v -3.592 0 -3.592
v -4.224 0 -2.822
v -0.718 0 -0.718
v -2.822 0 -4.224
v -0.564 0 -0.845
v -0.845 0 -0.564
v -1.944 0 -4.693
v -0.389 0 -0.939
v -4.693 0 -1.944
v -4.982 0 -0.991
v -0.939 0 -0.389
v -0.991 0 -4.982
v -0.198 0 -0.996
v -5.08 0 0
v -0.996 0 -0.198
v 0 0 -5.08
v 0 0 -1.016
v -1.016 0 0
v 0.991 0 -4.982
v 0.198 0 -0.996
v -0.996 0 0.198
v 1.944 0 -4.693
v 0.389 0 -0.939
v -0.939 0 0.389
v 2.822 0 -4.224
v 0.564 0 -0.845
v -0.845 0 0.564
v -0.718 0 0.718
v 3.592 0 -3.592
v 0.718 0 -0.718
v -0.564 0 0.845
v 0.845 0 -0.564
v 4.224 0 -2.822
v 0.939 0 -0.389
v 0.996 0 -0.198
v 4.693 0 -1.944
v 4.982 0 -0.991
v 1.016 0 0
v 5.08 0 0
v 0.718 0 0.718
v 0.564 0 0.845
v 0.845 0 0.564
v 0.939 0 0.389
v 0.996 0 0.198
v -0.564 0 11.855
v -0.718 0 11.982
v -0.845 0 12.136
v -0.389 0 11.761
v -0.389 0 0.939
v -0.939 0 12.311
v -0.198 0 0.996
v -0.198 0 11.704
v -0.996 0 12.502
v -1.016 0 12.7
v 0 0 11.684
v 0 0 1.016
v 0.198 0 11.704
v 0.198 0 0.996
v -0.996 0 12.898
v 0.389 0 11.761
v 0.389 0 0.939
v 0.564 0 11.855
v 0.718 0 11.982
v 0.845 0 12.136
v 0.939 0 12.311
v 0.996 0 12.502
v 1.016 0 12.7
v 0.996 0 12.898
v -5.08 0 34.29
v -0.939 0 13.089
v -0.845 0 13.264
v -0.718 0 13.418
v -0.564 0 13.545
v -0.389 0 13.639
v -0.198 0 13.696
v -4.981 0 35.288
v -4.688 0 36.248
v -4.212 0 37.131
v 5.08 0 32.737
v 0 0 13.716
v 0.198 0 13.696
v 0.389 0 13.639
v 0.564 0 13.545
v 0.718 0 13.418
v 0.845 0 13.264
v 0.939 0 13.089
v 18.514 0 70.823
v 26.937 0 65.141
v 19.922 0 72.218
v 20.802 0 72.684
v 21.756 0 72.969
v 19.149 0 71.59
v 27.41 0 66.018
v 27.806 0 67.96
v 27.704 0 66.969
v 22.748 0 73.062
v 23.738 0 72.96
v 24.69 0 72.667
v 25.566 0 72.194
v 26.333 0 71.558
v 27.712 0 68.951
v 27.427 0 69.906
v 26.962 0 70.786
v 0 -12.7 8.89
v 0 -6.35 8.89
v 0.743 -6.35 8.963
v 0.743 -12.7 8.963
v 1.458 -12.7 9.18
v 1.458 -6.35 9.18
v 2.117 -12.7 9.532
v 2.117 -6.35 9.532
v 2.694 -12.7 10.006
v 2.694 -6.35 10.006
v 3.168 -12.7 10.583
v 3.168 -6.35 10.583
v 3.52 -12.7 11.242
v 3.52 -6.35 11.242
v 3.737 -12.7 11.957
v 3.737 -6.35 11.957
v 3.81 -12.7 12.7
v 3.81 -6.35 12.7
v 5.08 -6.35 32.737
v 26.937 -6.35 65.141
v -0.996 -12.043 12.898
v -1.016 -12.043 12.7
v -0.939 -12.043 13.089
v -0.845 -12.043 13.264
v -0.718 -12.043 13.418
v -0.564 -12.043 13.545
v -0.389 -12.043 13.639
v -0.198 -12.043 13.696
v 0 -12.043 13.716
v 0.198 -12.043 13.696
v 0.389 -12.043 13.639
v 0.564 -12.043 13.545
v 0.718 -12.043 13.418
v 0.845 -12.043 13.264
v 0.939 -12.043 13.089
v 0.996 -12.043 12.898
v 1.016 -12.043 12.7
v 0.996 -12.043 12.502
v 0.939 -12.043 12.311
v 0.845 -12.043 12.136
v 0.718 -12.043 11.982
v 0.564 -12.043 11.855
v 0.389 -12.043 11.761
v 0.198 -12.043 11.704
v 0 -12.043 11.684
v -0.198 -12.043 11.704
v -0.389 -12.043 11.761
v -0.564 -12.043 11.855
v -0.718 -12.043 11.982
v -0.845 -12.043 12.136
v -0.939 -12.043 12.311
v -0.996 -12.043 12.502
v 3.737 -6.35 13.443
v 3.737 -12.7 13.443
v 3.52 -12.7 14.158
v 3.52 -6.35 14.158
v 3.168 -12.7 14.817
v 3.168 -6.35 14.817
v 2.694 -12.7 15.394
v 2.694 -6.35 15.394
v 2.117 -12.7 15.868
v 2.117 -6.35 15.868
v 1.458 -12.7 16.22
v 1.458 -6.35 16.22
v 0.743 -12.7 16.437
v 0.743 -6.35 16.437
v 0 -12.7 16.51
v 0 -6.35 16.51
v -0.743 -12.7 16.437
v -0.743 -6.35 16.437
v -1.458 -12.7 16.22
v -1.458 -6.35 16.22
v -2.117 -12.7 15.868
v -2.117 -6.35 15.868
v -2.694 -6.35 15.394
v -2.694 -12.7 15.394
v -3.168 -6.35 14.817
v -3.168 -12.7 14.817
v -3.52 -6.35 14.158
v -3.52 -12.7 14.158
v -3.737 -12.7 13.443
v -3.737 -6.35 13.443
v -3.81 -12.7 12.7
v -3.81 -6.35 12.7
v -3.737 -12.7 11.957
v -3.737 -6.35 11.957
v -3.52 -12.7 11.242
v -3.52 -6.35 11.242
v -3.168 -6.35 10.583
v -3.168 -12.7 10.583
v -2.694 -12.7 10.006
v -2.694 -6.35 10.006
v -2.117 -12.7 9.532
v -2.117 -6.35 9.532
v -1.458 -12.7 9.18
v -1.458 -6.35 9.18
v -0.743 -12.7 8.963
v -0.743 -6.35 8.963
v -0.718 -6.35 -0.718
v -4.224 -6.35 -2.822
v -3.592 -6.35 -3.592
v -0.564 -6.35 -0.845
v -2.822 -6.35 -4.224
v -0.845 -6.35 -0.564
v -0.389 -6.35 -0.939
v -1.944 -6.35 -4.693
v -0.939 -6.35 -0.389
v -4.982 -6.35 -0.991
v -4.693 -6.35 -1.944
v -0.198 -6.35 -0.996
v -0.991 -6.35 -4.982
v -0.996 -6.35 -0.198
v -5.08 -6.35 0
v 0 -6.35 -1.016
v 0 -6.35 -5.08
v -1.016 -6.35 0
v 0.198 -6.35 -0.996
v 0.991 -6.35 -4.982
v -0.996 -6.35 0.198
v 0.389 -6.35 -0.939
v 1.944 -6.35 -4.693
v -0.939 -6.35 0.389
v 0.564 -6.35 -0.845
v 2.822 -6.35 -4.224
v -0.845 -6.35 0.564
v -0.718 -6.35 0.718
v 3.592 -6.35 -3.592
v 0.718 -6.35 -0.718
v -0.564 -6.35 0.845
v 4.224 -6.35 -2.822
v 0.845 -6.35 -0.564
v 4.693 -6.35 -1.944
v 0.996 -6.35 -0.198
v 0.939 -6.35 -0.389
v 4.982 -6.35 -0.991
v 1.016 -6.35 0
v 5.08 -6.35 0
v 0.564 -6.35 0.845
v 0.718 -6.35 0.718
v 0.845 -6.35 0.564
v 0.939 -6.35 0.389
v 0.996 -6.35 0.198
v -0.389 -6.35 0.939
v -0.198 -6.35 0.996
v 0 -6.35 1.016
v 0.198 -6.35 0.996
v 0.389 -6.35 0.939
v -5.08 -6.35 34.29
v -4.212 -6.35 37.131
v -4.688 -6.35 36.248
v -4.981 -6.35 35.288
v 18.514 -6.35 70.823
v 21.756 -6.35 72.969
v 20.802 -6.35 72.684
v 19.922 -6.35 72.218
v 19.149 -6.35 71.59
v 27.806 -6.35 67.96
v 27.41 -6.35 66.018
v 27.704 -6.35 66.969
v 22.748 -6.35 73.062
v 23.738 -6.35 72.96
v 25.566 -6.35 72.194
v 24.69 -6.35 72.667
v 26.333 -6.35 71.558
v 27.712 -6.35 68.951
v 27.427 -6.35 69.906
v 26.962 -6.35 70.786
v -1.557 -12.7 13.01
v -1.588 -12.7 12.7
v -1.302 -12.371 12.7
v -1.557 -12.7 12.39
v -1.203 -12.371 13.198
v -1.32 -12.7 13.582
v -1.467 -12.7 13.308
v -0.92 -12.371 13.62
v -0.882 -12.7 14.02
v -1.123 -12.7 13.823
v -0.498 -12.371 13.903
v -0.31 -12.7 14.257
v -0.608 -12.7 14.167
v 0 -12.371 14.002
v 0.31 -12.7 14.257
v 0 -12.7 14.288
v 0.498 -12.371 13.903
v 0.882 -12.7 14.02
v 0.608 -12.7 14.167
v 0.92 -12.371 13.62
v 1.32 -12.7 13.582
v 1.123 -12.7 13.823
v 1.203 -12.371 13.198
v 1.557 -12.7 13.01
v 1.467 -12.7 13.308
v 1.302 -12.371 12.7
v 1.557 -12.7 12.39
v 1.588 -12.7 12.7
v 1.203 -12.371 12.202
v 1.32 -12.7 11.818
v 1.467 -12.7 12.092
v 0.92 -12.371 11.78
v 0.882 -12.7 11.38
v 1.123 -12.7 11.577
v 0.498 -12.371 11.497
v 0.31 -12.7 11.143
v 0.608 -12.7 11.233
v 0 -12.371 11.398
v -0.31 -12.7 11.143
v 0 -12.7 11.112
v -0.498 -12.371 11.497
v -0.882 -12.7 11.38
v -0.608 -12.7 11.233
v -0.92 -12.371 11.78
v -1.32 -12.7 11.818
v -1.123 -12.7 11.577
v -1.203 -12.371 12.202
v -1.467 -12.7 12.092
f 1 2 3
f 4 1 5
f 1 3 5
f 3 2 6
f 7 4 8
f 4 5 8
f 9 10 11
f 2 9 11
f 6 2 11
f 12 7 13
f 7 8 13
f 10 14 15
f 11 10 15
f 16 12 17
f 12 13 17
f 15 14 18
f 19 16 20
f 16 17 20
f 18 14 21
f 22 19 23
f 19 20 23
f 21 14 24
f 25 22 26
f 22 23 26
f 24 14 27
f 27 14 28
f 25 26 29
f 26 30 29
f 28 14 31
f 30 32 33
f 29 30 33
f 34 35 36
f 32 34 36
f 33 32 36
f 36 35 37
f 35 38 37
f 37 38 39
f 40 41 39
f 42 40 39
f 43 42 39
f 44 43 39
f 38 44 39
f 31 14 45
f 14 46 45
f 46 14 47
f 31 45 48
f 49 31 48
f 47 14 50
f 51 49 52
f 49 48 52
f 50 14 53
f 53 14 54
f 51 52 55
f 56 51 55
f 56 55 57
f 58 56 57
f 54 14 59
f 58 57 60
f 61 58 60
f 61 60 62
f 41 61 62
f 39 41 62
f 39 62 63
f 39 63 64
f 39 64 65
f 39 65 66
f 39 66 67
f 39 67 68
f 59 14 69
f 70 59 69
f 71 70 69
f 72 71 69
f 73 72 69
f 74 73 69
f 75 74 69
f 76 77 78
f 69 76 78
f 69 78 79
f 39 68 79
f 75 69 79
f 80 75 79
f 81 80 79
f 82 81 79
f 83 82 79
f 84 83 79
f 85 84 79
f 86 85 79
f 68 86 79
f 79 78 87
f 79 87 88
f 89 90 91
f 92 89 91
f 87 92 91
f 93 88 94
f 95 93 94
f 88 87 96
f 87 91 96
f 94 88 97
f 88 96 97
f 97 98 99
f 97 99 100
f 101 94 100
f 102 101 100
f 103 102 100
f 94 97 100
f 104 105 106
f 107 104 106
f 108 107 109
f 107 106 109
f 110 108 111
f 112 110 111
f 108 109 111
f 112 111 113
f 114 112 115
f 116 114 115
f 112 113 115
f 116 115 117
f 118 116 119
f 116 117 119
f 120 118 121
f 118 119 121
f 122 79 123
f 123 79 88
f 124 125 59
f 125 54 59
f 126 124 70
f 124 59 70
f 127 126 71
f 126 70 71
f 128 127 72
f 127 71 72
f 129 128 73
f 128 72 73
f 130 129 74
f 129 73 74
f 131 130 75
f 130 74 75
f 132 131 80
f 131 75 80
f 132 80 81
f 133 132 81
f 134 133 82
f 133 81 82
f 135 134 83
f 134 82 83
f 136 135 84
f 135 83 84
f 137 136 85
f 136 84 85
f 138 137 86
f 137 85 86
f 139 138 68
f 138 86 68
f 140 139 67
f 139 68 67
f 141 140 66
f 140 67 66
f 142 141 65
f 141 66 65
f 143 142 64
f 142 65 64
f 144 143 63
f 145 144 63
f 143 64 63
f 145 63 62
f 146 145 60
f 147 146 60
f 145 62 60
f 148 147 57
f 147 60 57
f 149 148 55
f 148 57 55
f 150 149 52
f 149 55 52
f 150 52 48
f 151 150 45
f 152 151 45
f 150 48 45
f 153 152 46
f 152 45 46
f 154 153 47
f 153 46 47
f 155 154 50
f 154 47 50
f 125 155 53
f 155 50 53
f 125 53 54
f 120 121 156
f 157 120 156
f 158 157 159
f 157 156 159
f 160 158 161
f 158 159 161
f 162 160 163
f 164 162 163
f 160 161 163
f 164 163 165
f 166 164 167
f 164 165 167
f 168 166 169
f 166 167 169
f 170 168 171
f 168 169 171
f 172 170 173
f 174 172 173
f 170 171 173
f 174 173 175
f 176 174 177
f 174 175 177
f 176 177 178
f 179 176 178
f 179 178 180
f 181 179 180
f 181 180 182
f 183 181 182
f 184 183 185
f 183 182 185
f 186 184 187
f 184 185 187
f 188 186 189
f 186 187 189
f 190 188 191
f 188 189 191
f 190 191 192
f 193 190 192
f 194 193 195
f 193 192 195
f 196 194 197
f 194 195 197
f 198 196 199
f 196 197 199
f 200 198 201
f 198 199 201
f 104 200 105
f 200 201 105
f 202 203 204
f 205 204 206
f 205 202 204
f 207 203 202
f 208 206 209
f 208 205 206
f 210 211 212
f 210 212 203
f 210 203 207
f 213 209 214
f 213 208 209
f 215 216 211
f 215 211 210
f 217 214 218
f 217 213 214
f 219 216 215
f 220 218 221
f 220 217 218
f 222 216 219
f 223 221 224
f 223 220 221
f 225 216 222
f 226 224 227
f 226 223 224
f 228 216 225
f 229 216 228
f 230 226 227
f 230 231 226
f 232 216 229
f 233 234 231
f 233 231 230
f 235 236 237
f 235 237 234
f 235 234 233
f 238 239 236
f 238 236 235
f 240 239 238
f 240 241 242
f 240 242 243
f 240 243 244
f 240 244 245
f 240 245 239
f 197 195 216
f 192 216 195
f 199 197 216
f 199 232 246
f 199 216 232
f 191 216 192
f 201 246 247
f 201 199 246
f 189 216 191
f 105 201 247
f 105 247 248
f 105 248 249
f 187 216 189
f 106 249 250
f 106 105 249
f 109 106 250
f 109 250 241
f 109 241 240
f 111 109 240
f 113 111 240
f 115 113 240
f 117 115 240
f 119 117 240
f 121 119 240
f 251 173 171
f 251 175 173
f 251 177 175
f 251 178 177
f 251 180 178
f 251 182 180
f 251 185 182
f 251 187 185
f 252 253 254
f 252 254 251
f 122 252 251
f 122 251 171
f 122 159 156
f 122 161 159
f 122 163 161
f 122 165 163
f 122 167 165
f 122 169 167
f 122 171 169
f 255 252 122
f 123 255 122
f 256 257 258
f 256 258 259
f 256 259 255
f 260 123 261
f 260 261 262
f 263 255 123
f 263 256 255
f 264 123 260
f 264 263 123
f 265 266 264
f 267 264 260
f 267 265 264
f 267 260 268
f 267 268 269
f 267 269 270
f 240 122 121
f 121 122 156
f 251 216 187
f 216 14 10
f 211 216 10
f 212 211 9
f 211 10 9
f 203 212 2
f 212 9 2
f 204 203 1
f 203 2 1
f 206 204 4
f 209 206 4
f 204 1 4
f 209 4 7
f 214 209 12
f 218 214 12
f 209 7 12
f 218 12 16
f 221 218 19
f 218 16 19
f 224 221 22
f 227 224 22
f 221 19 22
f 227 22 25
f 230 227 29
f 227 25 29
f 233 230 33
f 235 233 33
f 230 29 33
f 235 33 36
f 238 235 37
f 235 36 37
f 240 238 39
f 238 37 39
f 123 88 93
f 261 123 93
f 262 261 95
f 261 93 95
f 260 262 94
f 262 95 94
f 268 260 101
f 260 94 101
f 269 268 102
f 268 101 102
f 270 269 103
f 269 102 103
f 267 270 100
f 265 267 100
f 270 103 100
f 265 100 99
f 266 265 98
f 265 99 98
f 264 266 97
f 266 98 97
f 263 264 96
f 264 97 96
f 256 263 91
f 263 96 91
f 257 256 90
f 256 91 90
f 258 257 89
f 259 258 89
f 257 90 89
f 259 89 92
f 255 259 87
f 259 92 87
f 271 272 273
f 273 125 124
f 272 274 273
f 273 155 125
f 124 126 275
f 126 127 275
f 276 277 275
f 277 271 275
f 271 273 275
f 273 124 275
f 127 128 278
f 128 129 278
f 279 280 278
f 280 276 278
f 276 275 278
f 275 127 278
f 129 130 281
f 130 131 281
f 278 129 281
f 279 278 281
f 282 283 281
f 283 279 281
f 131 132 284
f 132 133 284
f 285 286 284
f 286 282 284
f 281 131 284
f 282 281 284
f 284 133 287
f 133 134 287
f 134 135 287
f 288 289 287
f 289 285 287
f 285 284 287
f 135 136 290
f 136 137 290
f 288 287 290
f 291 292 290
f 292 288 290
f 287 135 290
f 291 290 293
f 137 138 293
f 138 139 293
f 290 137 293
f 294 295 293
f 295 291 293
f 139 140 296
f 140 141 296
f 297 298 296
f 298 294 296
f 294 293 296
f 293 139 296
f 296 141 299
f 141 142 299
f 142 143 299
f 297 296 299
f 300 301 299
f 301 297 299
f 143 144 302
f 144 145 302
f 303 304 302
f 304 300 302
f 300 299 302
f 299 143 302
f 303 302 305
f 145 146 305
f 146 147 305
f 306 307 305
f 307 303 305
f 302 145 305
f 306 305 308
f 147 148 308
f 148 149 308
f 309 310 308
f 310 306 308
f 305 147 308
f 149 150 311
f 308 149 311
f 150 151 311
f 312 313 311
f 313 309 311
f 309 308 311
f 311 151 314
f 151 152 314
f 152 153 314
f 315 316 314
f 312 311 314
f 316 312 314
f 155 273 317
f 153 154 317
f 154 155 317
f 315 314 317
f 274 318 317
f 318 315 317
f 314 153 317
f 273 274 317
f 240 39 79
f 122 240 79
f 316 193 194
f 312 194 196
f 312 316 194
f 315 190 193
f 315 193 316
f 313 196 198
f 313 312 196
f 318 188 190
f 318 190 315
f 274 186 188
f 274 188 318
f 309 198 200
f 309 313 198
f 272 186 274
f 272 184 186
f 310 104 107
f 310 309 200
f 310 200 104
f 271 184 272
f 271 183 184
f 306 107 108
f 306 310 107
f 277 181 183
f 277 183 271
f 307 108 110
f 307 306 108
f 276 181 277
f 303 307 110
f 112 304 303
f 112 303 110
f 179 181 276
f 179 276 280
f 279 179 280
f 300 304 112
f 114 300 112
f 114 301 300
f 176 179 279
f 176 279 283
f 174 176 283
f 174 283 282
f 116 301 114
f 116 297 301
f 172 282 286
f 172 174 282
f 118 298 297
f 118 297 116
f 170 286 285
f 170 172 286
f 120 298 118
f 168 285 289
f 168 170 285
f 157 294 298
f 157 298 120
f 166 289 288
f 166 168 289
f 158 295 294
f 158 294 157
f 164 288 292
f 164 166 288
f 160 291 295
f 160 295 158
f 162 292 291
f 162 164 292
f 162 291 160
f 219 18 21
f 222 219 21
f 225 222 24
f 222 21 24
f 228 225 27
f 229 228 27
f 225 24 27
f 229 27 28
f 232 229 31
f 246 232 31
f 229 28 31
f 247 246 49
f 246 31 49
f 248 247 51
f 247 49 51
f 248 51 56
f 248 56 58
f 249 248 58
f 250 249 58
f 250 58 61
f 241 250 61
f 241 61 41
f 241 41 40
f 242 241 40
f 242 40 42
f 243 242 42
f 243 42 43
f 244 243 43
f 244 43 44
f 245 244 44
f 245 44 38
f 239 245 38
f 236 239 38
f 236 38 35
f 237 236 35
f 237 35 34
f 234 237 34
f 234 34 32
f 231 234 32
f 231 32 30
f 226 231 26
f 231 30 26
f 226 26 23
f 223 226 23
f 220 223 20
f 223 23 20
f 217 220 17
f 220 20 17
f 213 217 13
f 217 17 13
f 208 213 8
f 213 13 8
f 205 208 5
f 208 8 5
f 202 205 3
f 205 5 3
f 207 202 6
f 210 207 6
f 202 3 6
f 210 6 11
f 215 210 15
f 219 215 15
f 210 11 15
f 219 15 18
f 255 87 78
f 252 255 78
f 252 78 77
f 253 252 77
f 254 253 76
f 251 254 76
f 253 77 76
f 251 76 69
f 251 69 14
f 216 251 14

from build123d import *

# Parameters (mm, degrees)
F1_DEPTH       = 6.35
F3_DEPTH       = 6.35
F5_D           = 2.032
F5_CSINK_D     = 3.175
F5_CSINK_ANGLE = 82
F7_D           = 2.032


with BuildPart() as f1:
    # F0 (on Front) → F1 (new body)
    with BuildSketch(Plane.XZ):
        with BuildLine():
            ThreePointArc((-5.08, 12.7), (-3.5921024484, 9.1078975516), (0, 7.62))
            Line((0, 7.62), (0, 12.7))
            Line((0, 12.7), (0, 17.78))
            ThreePointArc((0, 17.78), (-3.5921024484, 16.2921024484), (-5.08, 12.7))
        make_face()
        with BuildLine():
            Line((0, 12.7), (0, 7.62))
            ThreePointArc((0, 7.62), (3.5921024484, 9.1078975516), (5.08, 12.7))
            ThreePointArc((5.08, 12.7), (3.5921024484, 16.2921024484), (0, 17.78))
            Line((0, 17.78), (0, 12.7))
        make_face()
        with BuildLine():
            ThreePointArc((5.08, 12.7), (3.5921024484, 9.1078975516), (0, 7.62))
            ThreePointArc((0, 7.62), (-3.5921024484, 9.1078975516), (-5.08, 12.7))
            Line((-5.08, 12.7), (-5.08, 0))
            ThreePointArc((-5.08, 0), (0, -5.08), (5.08, 0))
            Line((5.08, 0), (5.08, 12.7))
        make_face()
        with BuildLine():
            ThreePointArc((0, 17.78), (3.5921024484, 16.2921024484), (5.08, 12.7))
            Line((5.08, 12.7), (5.08, 32.7368881382))
            Line((5.08, 32.7368881382), (4.2115108686, 31.4493000504))
            ThreePointArc((4.2115108686, 31.4493000504), (2.384915539, 29.8046262283), (0, 29.21))
            Line((0, 29.21), (0, 17.78))
        make_face()
        with BuildLine():
            Line((-5.08, 34.29), (-5.08, 12.7))
            ThreePointArc((-5.08, 12.7), (-3.5921024484, 16.2921024484), (0, 17.78))
            Line((0, 17.78), (0, 29.21))
            ThreePointArc((0, 29.21), (-3.5921024484, 30.6978975516), (-5.08, 34.29))
        make_face()
        with BuildLine():
            Line((4.2115108686, 31.4493000504), (5.08, 32.7368881382))
            Line((5.08, 32.7368881382), (5.08, 34.29))
            ThreePointArc((5.08, 34.29), (4.4853737717, 36.674915539), (2.8406999496, 38.5015108686))
            Line((2.8406999496, 38.5015108686), (0, 34.29))
            Line((0, 34.29), (0, 29.21))
            ThreePointArc((0, 29.21), (2.384915539, 29.8046262283), (4.2115108686, 31.4493000504))
        make_face()
        with BuildLine():
            Line((5.08, 34.29), (5.08, 32.7368881382))
            Line((5.08, 32.7368881382), (26.9371104656, 65.141386999))
            ThreePointArc((26.9371104656, 65.141386999), (25.5662995467, 72.1935978172), (18.5140887285, 70.8227868983))
            Line((18.5140887285, 70.8227868983), (-4.2115108686, 37.1306999496))
            ThreePointArc((-4.2115108686, 37.1306999496), (-0.9693096965, 39.2766660919), (2.8406999496, 38.5015108686))
            ThreePointArc((2.8406999496, 38.5015108686), (4.4853737717, 36.674915539), (5.08, 34.29))
        make_face()
        with BuildLine():
            ThreePointArc((-4.2115108686, 37.1306999496), (-4.8580281603, 35.77524826), (-5.08, 34.29))
            ThreePointArc((-5.08, 34.29), (-3.5921024484, 30.6978975516), (0, 29.21))
            Line((0, 29.21), (0, 34.29))
            Line((0, 34.29), (2.8406999496, 38.5015108686))
            ThreePointArc((2.8406999496, 38.5015108686), (-0.9693096965, 39.2766660919), (-4.2115108686, 37.1306999496))
        make_face()
    extrude(amount=F1_DEPTH)

    # F2 (on face) → F3 (join)
    with BuildSketch(Plane.XZ.offset(6.35)):
        with BuildLine():
            ThreePointArc((0, 8.89), (2.6940768363, 10.0059231637), (3.81, 12.7))
            ThreePointArc((3.81, 12.7), (-2.6940768363, 15.3940768363), (0, 8.89))
        make_face()
    extrude(amount=F3_DEPTH)

    # F5 (through all)
    with Locations(Plane.XZ.offset(12.7)):
        with Locations((0, 12.7)):
            CounterSinkHole(F5_D / 2, F5_CSINK_D / 2, counter_sink_angle=F5_CSINK_ANGLE)

    # F7 (through all)
    with Locations(Plane.XZ.offset(6.35)):
        with Locations((0, 0)):
            Hole(F7_D / 2)


solid = f1.part
